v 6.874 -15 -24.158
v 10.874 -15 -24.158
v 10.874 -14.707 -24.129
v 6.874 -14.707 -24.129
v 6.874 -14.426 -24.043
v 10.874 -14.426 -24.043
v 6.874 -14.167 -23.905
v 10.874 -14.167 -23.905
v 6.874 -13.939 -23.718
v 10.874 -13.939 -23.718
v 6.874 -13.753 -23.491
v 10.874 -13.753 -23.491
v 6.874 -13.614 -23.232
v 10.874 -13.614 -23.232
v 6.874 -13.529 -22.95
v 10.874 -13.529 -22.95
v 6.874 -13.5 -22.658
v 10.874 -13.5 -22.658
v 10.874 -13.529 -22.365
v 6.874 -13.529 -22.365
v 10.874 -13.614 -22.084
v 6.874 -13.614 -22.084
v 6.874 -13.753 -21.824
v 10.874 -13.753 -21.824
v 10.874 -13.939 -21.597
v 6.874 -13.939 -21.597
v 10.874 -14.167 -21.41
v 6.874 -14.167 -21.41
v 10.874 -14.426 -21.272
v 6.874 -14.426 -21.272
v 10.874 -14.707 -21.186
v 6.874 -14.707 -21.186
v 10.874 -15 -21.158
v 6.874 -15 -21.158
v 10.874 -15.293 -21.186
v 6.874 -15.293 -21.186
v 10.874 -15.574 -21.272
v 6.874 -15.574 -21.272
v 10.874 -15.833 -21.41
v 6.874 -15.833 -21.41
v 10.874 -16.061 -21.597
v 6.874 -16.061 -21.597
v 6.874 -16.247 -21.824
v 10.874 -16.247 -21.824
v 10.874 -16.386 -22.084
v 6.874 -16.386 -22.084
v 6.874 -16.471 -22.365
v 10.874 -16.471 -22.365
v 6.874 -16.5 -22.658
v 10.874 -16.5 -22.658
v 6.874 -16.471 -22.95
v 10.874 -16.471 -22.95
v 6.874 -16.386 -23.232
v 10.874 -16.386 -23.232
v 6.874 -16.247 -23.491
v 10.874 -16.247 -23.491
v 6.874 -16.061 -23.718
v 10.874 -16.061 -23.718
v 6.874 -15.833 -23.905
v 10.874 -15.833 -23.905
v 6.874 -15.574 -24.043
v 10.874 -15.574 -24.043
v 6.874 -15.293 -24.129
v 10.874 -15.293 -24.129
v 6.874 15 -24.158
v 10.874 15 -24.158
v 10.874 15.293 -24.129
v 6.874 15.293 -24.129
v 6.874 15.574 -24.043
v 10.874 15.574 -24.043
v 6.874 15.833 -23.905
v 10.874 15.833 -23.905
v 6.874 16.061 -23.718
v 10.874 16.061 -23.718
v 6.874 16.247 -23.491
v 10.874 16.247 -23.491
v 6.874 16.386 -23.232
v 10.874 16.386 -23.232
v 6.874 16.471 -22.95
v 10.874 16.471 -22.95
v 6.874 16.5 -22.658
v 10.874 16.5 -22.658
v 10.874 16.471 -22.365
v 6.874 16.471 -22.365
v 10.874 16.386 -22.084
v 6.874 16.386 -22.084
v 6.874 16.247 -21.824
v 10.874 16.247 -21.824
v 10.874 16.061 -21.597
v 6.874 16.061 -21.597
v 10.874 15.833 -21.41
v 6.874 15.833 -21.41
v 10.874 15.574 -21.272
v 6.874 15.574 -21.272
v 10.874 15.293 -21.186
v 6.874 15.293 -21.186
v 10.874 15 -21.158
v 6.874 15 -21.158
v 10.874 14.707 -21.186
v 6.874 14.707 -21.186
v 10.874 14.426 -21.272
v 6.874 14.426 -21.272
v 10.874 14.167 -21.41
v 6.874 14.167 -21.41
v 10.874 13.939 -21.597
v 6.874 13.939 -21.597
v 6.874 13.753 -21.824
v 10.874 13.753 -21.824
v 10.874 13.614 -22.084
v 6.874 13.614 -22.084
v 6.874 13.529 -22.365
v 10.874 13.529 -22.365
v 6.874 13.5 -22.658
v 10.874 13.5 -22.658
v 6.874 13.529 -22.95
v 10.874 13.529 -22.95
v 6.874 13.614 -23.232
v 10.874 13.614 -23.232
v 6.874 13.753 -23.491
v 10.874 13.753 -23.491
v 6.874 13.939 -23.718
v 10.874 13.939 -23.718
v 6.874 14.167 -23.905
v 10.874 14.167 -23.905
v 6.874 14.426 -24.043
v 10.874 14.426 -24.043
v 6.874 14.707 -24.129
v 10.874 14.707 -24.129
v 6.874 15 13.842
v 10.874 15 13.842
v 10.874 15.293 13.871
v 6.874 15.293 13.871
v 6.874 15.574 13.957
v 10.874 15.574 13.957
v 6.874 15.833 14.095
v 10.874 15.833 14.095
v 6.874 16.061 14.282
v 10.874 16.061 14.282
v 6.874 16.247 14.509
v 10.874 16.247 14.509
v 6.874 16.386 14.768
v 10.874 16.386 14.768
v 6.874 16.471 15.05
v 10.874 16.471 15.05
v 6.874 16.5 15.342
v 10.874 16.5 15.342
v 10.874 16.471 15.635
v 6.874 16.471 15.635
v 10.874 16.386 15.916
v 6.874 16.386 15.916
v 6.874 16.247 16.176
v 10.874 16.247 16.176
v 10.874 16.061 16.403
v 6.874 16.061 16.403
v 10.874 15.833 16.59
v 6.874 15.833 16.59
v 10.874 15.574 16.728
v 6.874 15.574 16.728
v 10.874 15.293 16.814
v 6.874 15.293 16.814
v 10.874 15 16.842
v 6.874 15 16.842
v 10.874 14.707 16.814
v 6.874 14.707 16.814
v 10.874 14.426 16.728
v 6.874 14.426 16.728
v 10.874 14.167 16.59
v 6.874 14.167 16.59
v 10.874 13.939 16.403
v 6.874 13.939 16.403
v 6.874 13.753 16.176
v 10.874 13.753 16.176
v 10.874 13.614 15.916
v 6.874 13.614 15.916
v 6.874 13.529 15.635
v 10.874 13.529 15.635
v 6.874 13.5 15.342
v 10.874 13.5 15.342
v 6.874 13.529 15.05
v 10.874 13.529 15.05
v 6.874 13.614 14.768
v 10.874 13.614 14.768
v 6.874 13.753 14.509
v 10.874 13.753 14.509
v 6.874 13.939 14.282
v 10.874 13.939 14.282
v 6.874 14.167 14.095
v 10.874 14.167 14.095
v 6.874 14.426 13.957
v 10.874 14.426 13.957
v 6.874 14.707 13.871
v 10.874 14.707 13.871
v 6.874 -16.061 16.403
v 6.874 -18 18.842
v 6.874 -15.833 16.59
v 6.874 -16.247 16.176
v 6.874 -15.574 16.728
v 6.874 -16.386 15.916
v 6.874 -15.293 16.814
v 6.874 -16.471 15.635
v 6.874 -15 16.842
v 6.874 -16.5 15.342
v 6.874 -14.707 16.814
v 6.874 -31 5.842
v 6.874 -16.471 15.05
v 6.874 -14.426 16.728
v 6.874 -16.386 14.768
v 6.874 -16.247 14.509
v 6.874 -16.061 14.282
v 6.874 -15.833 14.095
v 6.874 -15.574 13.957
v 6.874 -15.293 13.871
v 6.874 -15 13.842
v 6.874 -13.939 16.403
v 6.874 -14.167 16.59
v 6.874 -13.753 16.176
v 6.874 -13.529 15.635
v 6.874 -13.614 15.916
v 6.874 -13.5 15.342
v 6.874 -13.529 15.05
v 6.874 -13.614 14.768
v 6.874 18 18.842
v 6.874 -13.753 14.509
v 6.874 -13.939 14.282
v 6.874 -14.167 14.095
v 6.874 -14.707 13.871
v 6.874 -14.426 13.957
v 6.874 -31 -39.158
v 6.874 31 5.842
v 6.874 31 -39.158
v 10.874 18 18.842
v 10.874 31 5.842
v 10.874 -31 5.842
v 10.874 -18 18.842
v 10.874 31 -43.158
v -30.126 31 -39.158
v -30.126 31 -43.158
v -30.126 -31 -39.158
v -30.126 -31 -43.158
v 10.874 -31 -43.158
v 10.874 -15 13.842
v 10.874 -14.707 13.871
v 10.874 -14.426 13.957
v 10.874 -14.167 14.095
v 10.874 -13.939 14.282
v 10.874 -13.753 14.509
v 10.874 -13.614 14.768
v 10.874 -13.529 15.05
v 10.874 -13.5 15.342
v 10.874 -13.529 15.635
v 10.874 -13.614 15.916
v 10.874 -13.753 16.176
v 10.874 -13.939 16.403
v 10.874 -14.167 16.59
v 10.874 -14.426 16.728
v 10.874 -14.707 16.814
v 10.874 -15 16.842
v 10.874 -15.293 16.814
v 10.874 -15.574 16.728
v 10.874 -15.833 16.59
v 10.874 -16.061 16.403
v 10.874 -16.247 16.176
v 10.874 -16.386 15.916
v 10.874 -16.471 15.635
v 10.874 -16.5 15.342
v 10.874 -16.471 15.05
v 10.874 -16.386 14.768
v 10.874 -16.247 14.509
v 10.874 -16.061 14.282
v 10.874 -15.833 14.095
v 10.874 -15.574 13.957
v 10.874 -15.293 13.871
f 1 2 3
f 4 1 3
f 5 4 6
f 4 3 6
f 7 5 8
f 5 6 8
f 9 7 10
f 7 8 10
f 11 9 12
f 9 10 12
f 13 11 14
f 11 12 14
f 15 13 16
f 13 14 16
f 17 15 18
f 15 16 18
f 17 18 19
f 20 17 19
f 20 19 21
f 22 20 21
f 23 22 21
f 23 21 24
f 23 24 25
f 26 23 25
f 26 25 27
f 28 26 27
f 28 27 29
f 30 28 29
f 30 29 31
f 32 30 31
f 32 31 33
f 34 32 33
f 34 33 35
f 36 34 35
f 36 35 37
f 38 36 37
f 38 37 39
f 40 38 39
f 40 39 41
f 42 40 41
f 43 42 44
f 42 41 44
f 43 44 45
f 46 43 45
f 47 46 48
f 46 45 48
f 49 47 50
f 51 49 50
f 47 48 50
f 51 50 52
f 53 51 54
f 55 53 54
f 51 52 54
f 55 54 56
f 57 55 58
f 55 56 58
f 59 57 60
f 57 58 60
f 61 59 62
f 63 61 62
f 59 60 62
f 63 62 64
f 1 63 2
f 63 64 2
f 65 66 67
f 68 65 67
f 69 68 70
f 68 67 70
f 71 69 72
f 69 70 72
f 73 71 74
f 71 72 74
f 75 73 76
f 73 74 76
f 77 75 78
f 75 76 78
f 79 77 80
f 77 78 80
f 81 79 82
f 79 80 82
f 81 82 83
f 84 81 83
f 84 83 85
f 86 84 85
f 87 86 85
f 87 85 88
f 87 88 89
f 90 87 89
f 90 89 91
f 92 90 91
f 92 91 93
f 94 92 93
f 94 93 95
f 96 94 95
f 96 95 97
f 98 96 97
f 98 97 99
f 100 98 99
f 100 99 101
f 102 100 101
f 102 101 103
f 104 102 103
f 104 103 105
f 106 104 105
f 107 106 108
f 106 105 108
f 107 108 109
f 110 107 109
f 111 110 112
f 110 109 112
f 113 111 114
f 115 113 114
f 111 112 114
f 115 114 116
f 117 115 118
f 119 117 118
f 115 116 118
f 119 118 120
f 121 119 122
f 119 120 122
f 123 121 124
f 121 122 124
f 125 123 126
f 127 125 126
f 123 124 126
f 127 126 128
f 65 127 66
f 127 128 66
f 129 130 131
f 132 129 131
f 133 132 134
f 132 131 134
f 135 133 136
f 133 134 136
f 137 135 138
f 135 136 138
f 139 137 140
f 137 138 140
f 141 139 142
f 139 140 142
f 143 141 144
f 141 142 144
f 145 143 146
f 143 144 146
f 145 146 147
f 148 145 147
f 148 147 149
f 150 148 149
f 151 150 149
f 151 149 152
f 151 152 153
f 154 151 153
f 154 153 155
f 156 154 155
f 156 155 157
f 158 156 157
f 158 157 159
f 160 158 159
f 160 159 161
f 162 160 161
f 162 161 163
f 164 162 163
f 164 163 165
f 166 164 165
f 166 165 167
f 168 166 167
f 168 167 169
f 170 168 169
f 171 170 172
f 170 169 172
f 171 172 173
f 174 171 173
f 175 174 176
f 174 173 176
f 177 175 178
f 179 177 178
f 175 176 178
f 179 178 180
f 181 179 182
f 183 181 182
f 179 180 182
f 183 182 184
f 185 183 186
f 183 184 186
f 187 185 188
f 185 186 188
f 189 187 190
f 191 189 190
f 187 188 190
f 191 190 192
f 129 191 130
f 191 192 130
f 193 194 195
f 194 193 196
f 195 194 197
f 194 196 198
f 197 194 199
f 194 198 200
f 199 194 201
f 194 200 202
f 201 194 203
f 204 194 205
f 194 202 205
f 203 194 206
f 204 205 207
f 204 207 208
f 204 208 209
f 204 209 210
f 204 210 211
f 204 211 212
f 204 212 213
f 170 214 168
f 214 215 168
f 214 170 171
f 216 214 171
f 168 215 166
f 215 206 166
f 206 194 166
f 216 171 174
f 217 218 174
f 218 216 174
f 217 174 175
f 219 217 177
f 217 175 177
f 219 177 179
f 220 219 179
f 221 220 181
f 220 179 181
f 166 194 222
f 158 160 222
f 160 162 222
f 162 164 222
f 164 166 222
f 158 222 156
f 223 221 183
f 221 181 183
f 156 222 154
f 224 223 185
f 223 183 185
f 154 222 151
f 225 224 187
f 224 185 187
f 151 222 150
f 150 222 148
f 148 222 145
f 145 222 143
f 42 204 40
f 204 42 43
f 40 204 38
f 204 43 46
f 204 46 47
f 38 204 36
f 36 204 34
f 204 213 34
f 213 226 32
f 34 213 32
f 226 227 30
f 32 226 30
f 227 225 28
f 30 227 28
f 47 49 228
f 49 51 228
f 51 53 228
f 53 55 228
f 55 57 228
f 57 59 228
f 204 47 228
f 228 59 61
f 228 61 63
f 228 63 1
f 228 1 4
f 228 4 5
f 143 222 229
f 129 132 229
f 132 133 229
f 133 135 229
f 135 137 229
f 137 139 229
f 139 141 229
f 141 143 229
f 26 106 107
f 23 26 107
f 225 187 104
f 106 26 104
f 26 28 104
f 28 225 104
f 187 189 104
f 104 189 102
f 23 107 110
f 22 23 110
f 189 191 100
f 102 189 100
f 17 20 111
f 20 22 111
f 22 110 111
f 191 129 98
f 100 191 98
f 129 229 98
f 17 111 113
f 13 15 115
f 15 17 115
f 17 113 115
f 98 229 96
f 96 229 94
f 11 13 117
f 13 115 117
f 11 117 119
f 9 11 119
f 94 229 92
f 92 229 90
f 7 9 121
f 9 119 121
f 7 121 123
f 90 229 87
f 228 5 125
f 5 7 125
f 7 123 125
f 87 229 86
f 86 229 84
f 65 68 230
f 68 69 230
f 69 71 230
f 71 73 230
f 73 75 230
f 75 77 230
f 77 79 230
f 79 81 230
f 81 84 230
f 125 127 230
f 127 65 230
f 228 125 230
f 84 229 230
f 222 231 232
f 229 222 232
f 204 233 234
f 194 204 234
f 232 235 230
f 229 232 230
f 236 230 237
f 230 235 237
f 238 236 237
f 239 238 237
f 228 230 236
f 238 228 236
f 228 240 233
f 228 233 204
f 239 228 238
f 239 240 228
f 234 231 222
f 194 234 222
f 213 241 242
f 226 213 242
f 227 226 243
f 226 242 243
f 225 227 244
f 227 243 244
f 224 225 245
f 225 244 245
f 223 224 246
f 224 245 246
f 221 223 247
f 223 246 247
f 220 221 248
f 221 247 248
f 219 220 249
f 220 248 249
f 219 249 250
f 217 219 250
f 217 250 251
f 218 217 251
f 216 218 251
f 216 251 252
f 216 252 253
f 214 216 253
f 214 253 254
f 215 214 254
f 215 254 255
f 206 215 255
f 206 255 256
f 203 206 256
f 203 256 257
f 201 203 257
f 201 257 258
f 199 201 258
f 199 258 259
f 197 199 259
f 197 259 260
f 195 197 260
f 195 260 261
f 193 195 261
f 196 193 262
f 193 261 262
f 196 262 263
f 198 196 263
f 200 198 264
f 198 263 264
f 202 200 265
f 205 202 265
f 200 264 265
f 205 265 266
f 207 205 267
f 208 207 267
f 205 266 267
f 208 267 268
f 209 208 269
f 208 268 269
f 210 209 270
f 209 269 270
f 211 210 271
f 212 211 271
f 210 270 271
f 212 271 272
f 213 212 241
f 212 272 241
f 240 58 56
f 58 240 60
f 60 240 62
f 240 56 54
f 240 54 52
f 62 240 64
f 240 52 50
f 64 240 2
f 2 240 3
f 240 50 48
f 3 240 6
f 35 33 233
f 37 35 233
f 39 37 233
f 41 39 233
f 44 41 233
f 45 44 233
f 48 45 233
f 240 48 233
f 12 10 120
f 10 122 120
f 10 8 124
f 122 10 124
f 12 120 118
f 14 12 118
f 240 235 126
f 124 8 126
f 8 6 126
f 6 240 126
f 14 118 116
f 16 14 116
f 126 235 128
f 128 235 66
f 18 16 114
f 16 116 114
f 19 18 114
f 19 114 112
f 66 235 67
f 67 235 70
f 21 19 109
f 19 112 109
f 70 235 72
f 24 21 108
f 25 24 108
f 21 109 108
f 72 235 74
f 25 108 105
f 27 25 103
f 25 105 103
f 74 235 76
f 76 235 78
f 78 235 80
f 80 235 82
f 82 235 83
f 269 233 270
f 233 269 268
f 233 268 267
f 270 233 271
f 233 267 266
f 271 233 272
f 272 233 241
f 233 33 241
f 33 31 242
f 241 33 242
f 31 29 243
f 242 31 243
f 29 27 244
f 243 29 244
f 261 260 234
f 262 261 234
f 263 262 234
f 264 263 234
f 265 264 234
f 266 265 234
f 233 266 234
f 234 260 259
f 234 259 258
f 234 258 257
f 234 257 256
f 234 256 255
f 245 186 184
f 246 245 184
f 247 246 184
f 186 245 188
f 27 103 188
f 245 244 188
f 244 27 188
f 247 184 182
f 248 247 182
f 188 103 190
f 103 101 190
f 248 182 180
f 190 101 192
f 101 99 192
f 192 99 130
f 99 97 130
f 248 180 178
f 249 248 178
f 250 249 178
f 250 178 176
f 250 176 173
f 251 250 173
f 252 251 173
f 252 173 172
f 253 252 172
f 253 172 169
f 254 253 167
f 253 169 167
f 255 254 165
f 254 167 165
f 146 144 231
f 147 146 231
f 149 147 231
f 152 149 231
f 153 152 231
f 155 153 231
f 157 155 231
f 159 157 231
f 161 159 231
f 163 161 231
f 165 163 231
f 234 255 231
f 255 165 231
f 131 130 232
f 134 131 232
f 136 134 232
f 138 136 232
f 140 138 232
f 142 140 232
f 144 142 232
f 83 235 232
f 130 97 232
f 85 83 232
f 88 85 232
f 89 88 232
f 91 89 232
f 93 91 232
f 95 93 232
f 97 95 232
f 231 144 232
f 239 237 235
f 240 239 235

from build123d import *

# Parameters (mm, degrees)
EXTRUDE_1_DEPTH     = 31
SKETCH_2_R          = 1.5
CUT_EXTRUDE_2_DEPTH = 10


with BuildPart() as part:
    # 草图1 → 凸台-拉伸1 (new, symmetric)
    with BuildSketch(Plane(origin=(0, 0, 0), x_dir=(1, 0, 0), z_dir=(0, 1, 0))):
        Polygon((-30.126027397, 43.157534247), (10.873972603, 43.157534247), (10.873972603, -18.842465753), (6.873972603, -18.842465753), (6.873972603, 39.157534247), (-30.126027397, 39.157534247), align=None)
    extrude(amount=EXTRUDE_1_DEPTH, both=True)

    # 草图2 → 切除-拉伸2 (cut)
    with BuildSketch(Plane(origin=(10.873972603, 0, 0), x_dir=(0, 0, -1), z_dir=(1, 0, 0))):
        Polygon((-5.842465753, 31), (-18.842465753, 31), (-18.842465753, 18), align=None)
        with Locations((22.657534247, -15)):
            Circle(SKETCH_2_R)
        Polygon((-5.842465753, -31), (-18.842465753, -18), (-18.842465753, -31), align=None)
        with Locations((22.657534247, 15)):
            Circle(SKETCH_2_R)
        with Locations((-15.342465753, 15)):
            Circle(SKETCH_2_R)
        with Locations((-15.342465753, -15)):
            Circle(SKETCH_2_R)
    extrude(amount=-CUT_EXTRUDE_2_DEPTH, mode=Mode.SUBTRACT)


solid = part.part
